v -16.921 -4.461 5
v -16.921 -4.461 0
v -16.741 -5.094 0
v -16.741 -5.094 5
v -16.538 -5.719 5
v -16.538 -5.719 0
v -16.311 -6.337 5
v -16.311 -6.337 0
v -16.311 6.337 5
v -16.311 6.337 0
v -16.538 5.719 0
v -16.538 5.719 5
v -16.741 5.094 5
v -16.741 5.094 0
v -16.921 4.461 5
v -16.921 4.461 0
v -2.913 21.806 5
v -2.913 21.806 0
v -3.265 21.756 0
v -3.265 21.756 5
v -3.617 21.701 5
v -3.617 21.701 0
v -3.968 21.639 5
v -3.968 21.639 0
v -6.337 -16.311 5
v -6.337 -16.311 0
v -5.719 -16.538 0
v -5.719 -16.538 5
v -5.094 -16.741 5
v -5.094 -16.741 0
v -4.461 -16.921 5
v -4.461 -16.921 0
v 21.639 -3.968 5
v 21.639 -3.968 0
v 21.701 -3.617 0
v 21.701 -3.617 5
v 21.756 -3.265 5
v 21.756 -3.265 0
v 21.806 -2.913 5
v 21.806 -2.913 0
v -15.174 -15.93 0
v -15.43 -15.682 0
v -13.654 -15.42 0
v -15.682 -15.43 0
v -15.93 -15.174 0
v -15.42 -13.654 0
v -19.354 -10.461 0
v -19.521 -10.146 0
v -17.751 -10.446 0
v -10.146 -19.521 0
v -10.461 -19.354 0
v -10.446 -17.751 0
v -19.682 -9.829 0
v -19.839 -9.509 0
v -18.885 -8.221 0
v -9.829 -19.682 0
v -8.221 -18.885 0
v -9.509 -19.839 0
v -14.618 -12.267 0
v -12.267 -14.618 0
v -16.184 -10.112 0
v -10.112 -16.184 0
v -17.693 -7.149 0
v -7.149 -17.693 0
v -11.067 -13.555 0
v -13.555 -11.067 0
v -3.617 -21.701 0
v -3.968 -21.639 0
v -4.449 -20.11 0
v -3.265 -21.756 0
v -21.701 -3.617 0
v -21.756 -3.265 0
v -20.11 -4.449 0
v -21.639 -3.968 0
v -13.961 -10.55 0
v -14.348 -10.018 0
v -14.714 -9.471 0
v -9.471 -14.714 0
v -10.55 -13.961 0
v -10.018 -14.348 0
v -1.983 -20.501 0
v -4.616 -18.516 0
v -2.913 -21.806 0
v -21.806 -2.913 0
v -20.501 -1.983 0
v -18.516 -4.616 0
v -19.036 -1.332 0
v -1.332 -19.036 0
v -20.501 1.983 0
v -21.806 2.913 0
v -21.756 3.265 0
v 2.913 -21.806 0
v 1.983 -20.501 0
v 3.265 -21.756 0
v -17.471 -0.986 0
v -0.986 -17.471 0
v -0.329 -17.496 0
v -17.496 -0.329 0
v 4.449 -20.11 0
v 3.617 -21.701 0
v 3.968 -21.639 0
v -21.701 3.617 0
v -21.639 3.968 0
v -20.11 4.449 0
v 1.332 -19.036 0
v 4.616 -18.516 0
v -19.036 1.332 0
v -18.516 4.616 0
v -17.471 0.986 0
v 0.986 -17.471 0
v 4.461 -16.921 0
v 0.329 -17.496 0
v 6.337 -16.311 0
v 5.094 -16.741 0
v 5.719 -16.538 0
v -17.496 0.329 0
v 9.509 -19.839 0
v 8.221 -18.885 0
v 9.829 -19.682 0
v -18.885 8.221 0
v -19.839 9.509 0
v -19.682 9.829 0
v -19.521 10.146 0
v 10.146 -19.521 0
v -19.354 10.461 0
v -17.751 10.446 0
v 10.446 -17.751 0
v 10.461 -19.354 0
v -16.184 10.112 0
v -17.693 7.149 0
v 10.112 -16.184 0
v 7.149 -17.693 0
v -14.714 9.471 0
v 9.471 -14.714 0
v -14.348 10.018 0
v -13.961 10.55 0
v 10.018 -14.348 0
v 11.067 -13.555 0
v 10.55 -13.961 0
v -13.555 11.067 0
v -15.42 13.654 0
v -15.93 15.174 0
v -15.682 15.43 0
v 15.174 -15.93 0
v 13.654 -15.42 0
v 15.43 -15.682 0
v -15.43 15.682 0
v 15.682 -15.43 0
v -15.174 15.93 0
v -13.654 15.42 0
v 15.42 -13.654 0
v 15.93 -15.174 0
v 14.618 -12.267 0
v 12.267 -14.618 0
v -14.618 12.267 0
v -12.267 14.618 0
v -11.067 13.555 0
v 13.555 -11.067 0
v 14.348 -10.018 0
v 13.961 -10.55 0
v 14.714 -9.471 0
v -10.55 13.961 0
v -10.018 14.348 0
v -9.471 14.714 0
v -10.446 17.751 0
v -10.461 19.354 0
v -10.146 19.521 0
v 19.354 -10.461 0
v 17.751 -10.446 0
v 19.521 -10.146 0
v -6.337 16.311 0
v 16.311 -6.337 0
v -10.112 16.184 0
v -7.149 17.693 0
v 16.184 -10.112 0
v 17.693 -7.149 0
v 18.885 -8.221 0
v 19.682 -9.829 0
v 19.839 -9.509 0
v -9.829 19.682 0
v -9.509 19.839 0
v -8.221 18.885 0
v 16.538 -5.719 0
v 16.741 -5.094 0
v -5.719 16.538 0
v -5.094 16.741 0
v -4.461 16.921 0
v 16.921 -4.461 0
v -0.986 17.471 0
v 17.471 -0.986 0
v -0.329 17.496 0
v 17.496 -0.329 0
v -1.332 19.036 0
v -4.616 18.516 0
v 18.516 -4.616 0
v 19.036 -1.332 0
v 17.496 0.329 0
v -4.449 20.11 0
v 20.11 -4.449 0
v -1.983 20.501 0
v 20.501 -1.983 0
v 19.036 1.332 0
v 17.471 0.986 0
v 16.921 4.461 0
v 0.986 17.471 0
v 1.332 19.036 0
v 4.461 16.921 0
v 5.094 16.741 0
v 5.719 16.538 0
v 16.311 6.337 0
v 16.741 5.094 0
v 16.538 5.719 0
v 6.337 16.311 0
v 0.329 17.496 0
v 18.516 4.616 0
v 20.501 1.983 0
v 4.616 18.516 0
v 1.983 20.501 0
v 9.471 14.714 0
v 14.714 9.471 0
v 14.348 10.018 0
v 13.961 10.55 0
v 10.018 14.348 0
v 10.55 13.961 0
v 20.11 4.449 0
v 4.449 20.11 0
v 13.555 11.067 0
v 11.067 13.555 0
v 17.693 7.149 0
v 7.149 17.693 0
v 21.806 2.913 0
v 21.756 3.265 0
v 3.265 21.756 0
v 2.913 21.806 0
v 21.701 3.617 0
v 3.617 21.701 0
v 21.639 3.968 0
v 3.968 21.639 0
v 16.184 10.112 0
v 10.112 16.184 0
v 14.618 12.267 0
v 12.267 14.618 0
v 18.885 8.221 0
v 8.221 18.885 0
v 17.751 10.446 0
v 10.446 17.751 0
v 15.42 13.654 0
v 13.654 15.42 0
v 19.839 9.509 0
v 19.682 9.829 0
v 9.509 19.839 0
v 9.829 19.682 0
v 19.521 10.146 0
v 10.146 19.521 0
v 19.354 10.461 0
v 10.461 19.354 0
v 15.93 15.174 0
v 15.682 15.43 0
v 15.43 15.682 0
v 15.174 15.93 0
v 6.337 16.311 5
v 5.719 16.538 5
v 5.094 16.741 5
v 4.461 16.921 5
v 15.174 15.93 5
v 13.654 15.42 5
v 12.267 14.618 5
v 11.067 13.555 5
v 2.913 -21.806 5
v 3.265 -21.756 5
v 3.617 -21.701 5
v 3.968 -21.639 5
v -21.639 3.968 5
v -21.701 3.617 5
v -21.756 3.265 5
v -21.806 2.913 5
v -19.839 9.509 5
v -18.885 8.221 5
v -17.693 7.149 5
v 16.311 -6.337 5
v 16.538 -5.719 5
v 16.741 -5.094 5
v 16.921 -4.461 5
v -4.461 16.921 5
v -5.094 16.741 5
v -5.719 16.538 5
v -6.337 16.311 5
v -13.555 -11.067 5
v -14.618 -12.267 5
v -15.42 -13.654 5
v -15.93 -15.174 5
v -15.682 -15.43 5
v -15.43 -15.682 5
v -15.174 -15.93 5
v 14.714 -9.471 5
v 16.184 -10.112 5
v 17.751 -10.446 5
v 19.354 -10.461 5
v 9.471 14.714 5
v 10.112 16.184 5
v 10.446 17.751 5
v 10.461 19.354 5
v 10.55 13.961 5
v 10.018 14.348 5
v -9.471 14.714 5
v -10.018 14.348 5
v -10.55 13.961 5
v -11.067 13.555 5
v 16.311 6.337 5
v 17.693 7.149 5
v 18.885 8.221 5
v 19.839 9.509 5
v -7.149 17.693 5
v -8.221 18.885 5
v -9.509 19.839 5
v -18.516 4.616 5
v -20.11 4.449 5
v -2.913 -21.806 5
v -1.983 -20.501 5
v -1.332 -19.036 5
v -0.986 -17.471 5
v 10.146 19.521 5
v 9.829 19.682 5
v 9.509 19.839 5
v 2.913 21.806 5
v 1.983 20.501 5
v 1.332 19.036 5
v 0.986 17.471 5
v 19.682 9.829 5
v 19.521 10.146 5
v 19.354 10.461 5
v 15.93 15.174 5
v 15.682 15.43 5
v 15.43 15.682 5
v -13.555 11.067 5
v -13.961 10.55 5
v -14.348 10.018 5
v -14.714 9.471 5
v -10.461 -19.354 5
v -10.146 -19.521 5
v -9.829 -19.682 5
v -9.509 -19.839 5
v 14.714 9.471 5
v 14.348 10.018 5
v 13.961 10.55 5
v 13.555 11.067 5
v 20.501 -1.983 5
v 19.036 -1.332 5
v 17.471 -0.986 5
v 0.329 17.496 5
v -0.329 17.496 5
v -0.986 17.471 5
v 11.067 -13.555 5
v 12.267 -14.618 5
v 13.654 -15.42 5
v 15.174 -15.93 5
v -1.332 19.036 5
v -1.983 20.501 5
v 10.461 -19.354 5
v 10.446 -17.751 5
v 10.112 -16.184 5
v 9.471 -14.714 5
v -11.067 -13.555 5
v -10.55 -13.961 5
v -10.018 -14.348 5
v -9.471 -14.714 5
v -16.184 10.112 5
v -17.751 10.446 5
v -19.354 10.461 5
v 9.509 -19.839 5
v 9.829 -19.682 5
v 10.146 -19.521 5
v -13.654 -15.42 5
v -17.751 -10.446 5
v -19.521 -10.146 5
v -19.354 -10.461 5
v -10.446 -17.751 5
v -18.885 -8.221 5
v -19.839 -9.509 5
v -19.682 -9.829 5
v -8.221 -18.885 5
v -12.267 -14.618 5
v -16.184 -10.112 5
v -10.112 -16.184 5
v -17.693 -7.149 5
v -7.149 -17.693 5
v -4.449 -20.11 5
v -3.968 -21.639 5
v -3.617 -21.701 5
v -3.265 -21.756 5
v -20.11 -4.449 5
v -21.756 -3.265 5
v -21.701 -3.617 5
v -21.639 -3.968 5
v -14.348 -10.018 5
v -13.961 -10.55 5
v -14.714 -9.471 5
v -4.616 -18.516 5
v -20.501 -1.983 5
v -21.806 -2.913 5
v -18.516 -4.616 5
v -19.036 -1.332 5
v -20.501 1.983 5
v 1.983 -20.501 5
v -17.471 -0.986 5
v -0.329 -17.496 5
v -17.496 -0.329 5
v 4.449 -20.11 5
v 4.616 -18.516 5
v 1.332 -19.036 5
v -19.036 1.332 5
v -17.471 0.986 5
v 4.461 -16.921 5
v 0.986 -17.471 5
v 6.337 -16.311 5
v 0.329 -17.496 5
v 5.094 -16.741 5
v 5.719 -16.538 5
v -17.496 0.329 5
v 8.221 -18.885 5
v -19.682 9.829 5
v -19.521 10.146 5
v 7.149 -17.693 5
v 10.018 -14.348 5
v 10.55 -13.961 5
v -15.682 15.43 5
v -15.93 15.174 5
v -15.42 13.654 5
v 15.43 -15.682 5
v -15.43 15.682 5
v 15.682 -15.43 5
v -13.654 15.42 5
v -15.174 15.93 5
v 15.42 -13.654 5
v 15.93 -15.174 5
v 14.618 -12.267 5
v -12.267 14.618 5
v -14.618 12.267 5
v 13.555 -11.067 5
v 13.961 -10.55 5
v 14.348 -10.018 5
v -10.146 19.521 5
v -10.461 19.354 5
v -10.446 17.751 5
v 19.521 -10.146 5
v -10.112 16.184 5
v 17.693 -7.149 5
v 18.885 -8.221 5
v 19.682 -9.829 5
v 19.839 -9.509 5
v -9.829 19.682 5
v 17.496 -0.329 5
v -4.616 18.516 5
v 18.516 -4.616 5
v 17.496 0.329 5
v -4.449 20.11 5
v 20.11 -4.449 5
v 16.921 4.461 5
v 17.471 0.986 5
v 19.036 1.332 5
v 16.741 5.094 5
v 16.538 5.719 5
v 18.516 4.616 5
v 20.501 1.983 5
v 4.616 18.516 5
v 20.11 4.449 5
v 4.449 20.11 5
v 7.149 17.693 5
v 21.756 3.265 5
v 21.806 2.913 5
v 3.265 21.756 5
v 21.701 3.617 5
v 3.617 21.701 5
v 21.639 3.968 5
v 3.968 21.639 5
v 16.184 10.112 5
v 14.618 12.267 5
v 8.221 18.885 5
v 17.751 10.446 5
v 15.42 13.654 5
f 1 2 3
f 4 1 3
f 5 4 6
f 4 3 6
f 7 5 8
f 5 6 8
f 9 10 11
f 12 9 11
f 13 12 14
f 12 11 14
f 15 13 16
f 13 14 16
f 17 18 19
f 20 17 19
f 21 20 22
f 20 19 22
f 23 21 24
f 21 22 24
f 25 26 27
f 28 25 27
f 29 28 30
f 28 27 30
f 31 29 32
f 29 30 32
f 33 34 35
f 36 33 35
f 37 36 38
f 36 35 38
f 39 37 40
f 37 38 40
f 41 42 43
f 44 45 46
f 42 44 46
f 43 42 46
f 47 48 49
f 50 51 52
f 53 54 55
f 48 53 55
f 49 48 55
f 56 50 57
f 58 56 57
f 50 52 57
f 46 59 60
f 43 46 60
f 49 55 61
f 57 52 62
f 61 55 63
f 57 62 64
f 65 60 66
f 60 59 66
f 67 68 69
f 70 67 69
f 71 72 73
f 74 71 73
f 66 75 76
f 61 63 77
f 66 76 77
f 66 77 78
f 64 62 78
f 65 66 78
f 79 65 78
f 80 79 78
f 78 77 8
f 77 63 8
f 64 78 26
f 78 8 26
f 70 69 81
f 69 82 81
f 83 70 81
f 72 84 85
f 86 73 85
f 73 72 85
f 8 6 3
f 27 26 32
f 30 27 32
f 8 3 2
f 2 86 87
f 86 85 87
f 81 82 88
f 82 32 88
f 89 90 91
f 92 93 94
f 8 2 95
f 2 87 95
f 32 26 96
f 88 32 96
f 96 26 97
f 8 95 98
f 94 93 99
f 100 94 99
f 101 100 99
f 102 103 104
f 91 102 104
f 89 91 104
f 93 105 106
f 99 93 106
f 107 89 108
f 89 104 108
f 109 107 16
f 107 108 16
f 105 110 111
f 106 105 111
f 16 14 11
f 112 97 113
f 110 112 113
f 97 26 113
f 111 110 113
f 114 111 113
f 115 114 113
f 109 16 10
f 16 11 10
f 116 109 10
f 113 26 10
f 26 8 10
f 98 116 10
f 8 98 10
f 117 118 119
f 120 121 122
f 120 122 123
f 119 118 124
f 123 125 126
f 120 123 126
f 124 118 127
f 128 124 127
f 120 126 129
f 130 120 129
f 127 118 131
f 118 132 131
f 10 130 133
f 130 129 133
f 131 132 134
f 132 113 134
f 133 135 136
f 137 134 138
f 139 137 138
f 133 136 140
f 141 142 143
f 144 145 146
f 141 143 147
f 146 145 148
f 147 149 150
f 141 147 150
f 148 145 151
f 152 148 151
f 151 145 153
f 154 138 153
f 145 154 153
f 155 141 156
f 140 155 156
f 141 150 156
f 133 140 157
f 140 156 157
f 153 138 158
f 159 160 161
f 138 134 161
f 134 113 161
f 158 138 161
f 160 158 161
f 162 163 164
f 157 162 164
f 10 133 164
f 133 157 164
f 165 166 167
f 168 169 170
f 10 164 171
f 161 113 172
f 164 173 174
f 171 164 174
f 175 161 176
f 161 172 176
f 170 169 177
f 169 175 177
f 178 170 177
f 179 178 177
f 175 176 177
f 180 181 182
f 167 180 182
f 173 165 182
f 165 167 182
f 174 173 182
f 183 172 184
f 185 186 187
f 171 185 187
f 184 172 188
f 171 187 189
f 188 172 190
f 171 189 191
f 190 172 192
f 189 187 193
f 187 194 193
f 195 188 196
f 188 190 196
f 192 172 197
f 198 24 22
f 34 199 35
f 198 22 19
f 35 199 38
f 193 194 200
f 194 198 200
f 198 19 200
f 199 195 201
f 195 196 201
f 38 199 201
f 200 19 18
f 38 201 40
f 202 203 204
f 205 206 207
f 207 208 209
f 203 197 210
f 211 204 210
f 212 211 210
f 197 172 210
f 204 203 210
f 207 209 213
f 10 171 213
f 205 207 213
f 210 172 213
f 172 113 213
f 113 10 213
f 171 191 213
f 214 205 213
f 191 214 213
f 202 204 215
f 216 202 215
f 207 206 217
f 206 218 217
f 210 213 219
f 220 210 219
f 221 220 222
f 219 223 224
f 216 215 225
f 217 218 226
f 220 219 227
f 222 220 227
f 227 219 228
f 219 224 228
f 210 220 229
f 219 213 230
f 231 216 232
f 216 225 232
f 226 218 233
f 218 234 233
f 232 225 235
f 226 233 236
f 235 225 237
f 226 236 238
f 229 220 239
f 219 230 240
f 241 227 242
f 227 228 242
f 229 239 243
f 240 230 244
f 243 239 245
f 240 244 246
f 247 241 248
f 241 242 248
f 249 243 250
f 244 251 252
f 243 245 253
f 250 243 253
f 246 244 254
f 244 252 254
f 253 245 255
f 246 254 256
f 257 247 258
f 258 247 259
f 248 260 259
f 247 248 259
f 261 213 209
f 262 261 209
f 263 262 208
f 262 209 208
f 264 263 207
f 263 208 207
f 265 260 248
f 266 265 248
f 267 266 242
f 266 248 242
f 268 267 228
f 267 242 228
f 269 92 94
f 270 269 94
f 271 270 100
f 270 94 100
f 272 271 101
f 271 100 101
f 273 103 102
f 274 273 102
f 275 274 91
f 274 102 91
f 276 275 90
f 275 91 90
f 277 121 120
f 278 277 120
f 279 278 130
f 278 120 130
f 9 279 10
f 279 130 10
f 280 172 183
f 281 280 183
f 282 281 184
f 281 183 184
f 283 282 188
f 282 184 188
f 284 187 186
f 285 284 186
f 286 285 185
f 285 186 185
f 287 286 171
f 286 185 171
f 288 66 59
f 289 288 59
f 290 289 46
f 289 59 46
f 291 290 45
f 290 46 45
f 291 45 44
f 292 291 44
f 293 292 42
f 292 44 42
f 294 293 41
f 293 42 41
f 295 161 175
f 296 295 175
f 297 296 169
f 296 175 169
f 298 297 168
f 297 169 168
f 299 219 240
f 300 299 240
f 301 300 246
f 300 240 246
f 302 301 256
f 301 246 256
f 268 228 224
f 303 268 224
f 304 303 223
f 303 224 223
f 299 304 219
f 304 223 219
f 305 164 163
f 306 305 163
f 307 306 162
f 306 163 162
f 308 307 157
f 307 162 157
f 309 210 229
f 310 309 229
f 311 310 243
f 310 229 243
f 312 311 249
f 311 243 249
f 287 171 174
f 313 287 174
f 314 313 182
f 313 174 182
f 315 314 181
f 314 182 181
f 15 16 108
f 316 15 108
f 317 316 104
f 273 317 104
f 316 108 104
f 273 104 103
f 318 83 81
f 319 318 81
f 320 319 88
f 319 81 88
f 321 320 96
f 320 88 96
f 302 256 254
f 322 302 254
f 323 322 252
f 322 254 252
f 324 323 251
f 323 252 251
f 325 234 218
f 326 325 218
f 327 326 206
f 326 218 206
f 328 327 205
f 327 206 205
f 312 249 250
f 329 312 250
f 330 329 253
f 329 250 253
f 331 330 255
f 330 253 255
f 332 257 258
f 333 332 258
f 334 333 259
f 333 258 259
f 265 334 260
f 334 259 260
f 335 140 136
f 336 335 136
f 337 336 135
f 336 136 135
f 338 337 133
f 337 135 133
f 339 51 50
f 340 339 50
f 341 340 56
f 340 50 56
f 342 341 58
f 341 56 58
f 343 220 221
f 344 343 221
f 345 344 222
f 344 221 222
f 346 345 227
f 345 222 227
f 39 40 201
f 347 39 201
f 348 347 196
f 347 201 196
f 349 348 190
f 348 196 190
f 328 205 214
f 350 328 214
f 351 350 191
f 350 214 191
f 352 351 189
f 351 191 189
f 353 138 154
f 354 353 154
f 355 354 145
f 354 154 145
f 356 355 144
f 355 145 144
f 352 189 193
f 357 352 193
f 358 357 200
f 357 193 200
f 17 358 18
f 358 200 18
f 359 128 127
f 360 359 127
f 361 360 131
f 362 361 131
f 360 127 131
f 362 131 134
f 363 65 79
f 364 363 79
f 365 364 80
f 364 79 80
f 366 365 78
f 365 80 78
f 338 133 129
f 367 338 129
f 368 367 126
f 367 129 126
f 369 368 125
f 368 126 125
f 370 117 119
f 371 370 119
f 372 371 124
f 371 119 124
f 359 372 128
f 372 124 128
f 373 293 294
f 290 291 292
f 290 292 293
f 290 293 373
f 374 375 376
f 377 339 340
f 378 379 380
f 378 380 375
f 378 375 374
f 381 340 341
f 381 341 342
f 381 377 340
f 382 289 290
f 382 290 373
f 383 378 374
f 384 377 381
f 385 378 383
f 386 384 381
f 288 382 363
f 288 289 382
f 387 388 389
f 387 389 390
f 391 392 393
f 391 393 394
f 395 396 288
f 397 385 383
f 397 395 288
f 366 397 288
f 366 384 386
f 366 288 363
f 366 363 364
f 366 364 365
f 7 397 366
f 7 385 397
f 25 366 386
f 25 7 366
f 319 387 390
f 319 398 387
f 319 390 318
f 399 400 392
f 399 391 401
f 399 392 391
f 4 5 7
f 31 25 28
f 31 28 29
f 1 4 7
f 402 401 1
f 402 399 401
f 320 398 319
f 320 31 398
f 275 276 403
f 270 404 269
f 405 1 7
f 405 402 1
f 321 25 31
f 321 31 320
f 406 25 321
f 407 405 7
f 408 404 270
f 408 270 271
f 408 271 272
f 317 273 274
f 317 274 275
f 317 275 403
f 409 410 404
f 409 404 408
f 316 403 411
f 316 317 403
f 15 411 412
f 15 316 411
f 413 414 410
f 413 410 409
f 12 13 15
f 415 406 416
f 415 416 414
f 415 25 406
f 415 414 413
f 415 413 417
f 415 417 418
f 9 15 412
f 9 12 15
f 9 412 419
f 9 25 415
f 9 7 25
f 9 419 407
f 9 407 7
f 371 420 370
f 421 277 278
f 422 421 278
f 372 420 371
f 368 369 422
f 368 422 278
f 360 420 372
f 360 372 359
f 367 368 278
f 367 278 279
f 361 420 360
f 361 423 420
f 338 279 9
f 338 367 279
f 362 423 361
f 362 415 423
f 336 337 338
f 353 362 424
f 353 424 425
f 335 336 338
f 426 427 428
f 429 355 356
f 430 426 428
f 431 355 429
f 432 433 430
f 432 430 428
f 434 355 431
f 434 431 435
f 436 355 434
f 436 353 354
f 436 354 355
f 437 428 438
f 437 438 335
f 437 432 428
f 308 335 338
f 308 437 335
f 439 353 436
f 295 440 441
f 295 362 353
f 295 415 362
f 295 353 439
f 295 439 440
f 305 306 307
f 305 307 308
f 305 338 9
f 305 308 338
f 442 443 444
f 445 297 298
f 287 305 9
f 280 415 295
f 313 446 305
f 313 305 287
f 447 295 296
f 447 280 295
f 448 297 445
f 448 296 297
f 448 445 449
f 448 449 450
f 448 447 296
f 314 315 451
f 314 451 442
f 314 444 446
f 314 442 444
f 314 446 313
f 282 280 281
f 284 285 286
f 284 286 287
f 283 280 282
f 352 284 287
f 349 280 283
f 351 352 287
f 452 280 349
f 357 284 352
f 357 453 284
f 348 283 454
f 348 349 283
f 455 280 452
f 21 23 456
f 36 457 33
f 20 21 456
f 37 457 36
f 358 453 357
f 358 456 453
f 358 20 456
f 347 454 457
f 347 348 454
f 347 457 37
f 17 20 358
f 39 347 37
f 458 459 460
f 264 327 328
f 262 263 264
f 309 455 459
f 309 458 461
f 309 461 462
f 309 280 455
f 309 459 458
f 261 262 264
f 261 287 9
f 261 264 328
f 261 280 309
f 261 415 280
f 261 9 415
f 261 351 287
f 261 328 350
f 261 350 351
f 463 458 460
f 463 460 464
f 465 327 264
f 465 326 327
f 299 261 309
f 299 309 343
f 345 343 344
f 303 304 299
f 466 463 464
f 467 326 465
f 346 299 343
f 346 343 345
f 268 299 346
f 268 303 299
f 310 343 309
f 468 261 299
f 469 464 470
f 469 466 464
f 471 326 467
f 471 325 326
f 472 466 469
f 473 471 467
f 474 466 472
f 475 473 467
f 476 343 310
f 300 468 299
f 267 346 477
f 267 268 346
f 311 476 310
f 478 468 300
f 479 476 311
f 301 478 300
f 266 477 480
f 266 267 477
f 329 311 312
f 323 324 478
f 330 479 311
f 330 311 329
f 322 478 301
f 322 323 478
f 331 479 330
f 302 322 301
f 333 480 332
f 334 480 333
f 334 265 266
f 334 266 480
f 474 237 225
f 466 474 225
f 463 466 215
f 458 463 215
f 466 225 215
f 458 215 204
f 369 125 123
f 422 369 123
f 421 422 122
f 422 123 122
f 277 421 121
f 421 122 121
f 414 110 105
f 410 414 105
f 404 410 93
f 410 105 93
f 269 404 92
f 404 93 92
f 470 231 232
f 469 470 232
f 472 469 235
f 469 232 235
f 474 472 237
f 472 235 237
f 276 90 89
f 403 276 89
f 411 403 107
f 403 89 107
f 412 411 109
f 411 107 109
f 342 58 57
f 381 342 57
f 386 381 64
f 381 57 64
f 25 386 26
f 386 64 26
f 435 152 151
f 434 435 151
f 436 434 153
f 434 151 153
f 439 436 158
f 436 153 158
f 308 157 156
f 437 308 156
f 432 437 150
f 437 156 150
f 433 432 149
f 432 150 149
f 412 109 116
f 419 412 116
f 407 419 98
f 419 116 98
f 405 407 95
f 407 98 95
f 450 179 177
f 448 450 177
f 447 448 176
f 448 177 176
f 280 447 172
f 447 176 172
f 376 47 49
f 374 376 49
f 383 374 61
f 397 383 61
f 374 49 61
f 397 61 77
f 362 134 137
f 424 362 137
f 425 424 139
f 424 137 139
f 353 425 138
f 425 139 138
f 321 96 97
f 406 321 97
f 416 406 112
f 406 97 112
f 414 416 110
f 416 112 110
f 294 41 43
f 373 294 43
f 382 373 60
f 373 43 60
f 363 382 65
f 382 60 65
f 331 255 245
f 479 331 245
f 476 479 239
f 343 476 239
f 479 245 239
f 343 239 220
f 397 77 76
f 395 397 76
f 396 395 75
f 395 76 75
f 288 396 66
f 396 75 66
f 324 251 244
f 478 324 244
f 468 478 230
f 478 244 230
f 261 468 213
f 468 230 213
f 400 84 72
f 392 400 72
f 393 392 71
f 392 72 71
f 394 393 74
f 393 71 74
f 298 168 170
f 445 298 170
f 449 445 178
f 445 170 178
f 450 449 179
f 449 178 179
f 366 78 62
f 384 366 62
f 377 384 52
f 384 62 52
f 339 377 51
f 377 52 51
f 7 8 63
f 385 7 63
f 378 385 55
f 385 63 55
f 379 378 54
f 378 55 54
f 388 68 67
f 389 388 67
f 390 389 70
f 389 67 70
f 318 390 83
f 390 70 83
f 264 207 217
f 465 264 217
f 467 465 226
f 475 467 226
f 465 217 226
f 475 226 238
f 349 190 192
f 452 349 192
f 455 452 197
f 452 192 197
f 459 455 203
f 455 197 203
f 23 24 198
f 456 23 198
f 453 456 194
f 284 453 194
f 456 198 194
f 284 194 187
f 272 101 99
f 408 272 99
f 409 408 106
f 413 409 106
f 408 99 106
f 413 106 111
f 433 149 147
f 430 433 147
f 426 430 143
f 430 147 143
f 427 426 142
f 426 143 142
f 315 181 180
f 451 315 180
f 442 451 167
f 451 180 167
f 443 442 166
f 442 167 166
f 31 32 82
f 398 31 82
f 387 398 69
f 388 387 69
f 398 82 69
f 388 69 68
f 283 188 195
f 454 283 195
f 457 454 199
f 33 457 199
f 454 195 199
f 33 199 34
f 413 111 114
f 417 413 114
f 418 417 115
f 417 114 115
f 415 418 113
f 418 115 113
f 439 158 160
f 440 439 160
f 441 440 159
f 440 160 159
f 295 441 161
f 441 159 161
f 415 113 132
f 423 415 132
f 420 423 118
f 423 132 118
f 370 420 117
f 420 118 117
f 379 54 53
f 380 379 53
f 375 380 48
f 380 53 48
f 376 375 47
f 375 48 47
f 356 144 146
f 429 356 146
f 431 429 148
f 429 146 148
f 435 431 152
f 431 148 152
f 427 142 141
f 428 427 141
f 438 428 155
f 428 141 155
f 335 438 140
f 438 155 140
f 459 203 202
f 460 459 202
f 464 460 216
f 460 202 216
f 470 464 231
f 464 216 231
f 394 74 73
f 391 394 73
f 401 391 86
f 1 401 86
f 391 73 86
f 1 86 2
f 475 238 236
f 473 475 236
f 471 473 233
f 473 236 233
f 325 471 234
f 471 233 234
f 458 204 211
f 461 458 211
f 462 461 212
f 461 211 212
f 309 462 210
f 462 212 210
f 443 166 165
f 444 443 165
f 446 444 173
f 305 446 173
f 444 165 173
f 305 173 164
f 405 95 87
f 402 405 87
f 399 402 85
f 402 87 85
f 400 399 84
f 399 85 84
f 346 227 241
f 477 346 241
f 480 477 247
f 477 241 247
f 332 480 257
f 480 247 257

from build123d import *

# Parameters (mm, degrees)
BOSS_EXTRUDE1_DEPTH = 5


with BuildPart() as part:
    # Sketch1 → Boss-Extrude1 (new body)
    with BuildSketch(Plane.XY):
        with BuildLine():
            ThreePointArc((-21.806333941, 2.912696354), (-19.784848102, 1.620704589), (-17.471189616, 0.986171591))
            ThreePointArc((-17.471189616, 0.986171591), (-17.499, 0), (-17.471189616, -0.986171591))
            ThreePointArc((-17.471189616, -0.986171591), (-19.784848102, -1.620704589), (-21.806333941, -2.912696354))
            ThreePointArc((-21.806333941, -2.912696354), (-21.729143493, -3.441558231), (-21.639128664, -3.968388926))
            ThreePointArc((-21.639128664, -3.968388926), (-19.317333972, -4.572472634), (-16.920832513, -4.460989585))
            ThreePointArc((-16.920832513, -4.460989585), (-16.642537979, -5.407488385), (-16.31134495, -6.336799421))
            ThreePointArc((-16.31134495, -6.336799421), (-18.31568345, -7.655235955), (-19.838983319, -9.50866662))
            ThreePointArc((-19.838983319, -9.50866662), (-19.602143532, -9.987790994), (-19.353734704, -10.461020648))
            ThreePointArc((-19.353734704, -10.461020648), (-16.958904602, -10.318064378), (-14.714146429, -9.471478019))
            ThreePointArc((-14.714146429, -9.471478019), (-14.156988385, -10.28565413), (-13.554832194, -11.067137173))
            ThreePointArc((-13.554832194, -11.067137173), (-15.05365209, -12.940419489), (-15.929654782, -15.173862347))
            ThreePointArc((-15.929654782, -15.173862347), (-15.556349186, -15.556349186), (-15.173862347, -15.929654782))
            ThreePointArc((-15.173862347, -15.929654782), (-12.940419489, -15.05365209), (-11.067137173, -13.554832194))
            ThreePointArc((-11.067137173, -13.554832194), (-10.28565413, -14.156988385), (-9.471478019, -14.714146429))
            ThreePointArc((-9.471478019, -14.714146429), (-10.318064378, -16.958904602), (-10.461020648, -19.353734704))
            ThreePointArc((-10.461020648, -19.353734704), (-9.987790994, -19.602143532), (-9.50866662, -19.838983319))
            ThreePointArc((-9.50866662, -19.838983319), (-7.655235955, -18.31568345), (-6.336799421, -16.31134495))
            ThreePointArc((-6.336799421, -16.31134495), (-5.407488385, -16.642537979), (-4.460989585, -16.920832513))
            ThreePointArc((-4.460989585, -16.920832513), (-4.572472634, -19.317333972), (-3.968388926, -21.639128664))
            ThreePointArc((-3.968388926, -21.639128664), (-3.441558231, -21.729143493), (-2.912696354, -21.806333941))
            ThreePointArc((-2.912696354, -21.806333941), (-1.620704589, -19.784848102), (-0.986171591, -17.471189616))
            ThreePointArc((-0.986171591, -17.471189616), (0, -17.499), (0.986171591, -17.471189616))
            ThreePointArc((0.986171591, -17.471189616), (1.620704589, -19.784848102), (2.912696354, -21.806333941))
            ThreePointArc((2.912696354, -21.806333941), (3.441558231, -21.729143493), (3.968388926, -21.639128664))
            ThreePointArc((3.968388926, -21.639128664), (4.572472634, -19.317333972), (4.460989585, -16.920832513))
            ThreePointArc((4.460989585, -16.920832513), (5.407488385, -16.642537979), (6.336799421, -16.31134495))
            ThreePointArc((6.336799421, -16.31134495), (7.655235955, -18.31568345), (9.50866662, -19.838983319))
            ThreePointArc((9.50866662, -19.838983319), (9.987790994, -19.602143532), (10.461020648, -19.353734704))
            ThreePointArc((10.461020648, -19.353734704), (10.318064378, -16.958904602), (9.471478019, -14.714146429))
            ThreePointArc((9.471478019, -14.714146429), (10.28565413, -14.156988385), (11.067137173, -13.554832194))
            ThreePointArc((11.067137173, -13.554832194), (12.940419489, -15.05365209), (15.173862347, -15.929654782))
            ThreePointArc((15.173862347, -15.929654782), (15.556349186, -15.556349186), (15.929654782, -15.173862347))
            ThreePointArc((15.929654782, -15.173862347), (15.05365209, -12.940419489), (13.554832194, -11.067137173))
            ThreePointArc((13.554832194, -11.067137173), (14.156988385, -10.28565413), (14.714146429, -9.471478019))
            ThreePointArc((14.714146429, -9.471478019), (16.958904602, -10.318064378), (19.353734704, -10.461020648))
            ThreePointArc((19.353734704, -10.461020648), (19.602143532, -9.987790994), (19.838983319, -9.50866662))
            ThreePointArc((19.838983319, -9.50866662), (18.31568345, -7.655235955), (16.31134495, -6.336799421))
            ThreePointArc((16.31134495, -6.336799421), (16.642537979, -5.407488385), (16.920832513, -4.460989585))
            ThreePointArc((16.920832513, -4.460989585), (19.317333972, -4.572472634), (21.639128664, -3.968388926))
            ThreePointArc((21.639128664, -3.968388926), (21.729143493, -3.441558231), (21.806333941, -2.912696354))
            ThreePointArc((21.806333941, -2.912696354), (19.784848102, -1.620704589), (17.471189616, -0.986171591))
            ThreePointArc((17.471189616, -0.986171591), (17.499, 0), (17.471189616, 0.986171591))
            ThreePointArc((17.471189616, 0.986171591), (19.784848102, 1.620704589), (21.806333941, 2.912696354))
            ThreePointArc((21.806333941, 2.912696354), (21.729143493, 3.441558231), (21.639128664, 3.968388926))
            ThreePointArc((21.639128664, 3.968388926), (19.317333972, 4.572472634), (16.920832513, 4.460989585))
            ThreePointArc((16.920832513, 4.460989585), (16.642537979, 5.407488385), (16.31134495, 6.336799421))
            ThreePointArc((16.31134495, 6.336799421), (18.31568345, 7.655235955), (19.838983319, 9.50866662))
            ThreePointArc((19.838983319, 9.50866662), (19.602143532, 9.987790994), (19.353734704, 10.461020648))
            ThreePointArc((19.353734704, 10.461020648), (16.958904602, 10.318064378), (14.714146429, 9.471478019))
            ThreePointArc((14.714146429, 9.471478019), (14.156988385, 10.28565413), (13.554832194, 11.067137173))
            ThreePointArc((13.554832194, 11.067137173), (15.05365209, 12.940419489), (15.929654782, 15.173862347))
            ThreePointArc((15.929654782, 15.173862347), (15.556349186, 15.556349186), (15.173862347, 15.929654782))
            ThreePointArc((15.173862347, 15.929654782), (12.940419489, 15.05365209), (11.067137173, 13.554832194))
            ThreePointArc((11.067137173, 13.554832194), (10.28565413, 14.156988385), (9.471478019, 14.714146429))
            ThreePointArc((9.471478019, 14.714146429), (10.318064378, 16.958904602), (10.461020648, 19.353734704))
            ThreePointArc((10.461020648, 19.353734704), (9.987790994, 19.602143532), (9.50866662, 19.838983319))
            ThreePointArc((9.50866662, 19.838983319), (7.655235955, 18.31568345), (6.336799421, 16.31134495))
            ThreePointArc((6.336799421, 16.31134495), (5.407488385, 16.642537979), (4.460989585, 16.920832513))
            ThreePointArc((4.460989585, 16.920832513), (4.572472634, 19.317333972), (3.968388926, 21.639128664))
            ThreePointArc((3.968388926, 21.639128664), (3.441558231, 21.729143493), (2.912696354, 21.806333941))
            ThreePointArc((2.912696354, 21.806333941), (1.620704589, 19.784848102), (0.986171591, 17.471189616))
            ThreePointArc((0.986171591, 17.471189616), (0, 17.499), (-0.986171591, 17.471189616))
            ThreePointArc((-0.986171591, 17.471189616), (-1.620704589, 19.784848102), (-2.912696354, 21.806333941))
            ThreePointArc((-2.912696354, 21.806333941), (-3.441558231, 21.729143493), (-3.968388926, 21.639128664))
            ThreePointArc((-3.968388926, 21.639128664), (-4.572472634, 19.317333972), (-4.460989585, 16.920832513))
            ThreePointArc((-4.460989585, 16.920832513), (-5.407488385, 16.642537979), (-6.336799421, 16.31134495))
            ThreePointArc((-6.336799421, 16.31134495), (-7.655235955, 18.31568345), (-9.50866662, 19.838983319))
            ThreePointArc((-9.50866662, 19.838983319), (-9.987790994, 19.602143532), (-10.461020648, 19.353734704))
            ThreePointArc((-10.461020648, 19.353734704), (-10.318064378, 16.958904602), (-9.471478019, 14.714146429))
            ThreePointArc((-9.471478019, 14.714146429), (-10.28565413, 14.156988385), (-11.067137173, 13.554832194))
            ThreePointArc((-11.067137173, 13.554832194), (-12.940419489, 15.05365209), (-15.173862347, 15.929654782))
            ThreePointArc((-15.173862347, 15.929654782), (-15.556349186, 15.556349186), (-15.929654782, 15.173862347))
            ThreePointArc((-15.929654782, 15.173862347), (-15.05365209, 12.940419489), (-13.554832194, 11.067137173))
            ThreePointArc((-13.554832194, 11.067137173), (-14.156988385, 10.28565413), (-14.714146429, 9.471478019))
            ThreePointArc((-14.714146429, 9.471478019), (-16.958904602, 10.318064378), (-19.353734704, 10.461020648))
            ThreePointArc((-19.353734704, 10.461020648), (-19.602143532, 9.987790994), (-19.838983319, 9.50866662))
            ThreePointArc((-19.838983319, 9.50866662), (-18.31568345, 7.655235955), (-16.31134495, 6.336799421))
            ThreePointArc((-16.31134495, 6.336799421), (-16.642537979, 5.407488385), (-16.920832513, 4.460989585))
            ThreePointArc((-16.920832513, 4.460989585), (-19.317333972, 4.572472634), (-21.639128664, 3.968388926))
            ThreePointArc((-21.639128664, 3.968388926), (-21.729143493, 3.441558231), (-21.806333941, 2.912696354))
        make_face()
    extrude(amount=BOSS_EXTRUDE1_DEPTH)


solid = part.part
